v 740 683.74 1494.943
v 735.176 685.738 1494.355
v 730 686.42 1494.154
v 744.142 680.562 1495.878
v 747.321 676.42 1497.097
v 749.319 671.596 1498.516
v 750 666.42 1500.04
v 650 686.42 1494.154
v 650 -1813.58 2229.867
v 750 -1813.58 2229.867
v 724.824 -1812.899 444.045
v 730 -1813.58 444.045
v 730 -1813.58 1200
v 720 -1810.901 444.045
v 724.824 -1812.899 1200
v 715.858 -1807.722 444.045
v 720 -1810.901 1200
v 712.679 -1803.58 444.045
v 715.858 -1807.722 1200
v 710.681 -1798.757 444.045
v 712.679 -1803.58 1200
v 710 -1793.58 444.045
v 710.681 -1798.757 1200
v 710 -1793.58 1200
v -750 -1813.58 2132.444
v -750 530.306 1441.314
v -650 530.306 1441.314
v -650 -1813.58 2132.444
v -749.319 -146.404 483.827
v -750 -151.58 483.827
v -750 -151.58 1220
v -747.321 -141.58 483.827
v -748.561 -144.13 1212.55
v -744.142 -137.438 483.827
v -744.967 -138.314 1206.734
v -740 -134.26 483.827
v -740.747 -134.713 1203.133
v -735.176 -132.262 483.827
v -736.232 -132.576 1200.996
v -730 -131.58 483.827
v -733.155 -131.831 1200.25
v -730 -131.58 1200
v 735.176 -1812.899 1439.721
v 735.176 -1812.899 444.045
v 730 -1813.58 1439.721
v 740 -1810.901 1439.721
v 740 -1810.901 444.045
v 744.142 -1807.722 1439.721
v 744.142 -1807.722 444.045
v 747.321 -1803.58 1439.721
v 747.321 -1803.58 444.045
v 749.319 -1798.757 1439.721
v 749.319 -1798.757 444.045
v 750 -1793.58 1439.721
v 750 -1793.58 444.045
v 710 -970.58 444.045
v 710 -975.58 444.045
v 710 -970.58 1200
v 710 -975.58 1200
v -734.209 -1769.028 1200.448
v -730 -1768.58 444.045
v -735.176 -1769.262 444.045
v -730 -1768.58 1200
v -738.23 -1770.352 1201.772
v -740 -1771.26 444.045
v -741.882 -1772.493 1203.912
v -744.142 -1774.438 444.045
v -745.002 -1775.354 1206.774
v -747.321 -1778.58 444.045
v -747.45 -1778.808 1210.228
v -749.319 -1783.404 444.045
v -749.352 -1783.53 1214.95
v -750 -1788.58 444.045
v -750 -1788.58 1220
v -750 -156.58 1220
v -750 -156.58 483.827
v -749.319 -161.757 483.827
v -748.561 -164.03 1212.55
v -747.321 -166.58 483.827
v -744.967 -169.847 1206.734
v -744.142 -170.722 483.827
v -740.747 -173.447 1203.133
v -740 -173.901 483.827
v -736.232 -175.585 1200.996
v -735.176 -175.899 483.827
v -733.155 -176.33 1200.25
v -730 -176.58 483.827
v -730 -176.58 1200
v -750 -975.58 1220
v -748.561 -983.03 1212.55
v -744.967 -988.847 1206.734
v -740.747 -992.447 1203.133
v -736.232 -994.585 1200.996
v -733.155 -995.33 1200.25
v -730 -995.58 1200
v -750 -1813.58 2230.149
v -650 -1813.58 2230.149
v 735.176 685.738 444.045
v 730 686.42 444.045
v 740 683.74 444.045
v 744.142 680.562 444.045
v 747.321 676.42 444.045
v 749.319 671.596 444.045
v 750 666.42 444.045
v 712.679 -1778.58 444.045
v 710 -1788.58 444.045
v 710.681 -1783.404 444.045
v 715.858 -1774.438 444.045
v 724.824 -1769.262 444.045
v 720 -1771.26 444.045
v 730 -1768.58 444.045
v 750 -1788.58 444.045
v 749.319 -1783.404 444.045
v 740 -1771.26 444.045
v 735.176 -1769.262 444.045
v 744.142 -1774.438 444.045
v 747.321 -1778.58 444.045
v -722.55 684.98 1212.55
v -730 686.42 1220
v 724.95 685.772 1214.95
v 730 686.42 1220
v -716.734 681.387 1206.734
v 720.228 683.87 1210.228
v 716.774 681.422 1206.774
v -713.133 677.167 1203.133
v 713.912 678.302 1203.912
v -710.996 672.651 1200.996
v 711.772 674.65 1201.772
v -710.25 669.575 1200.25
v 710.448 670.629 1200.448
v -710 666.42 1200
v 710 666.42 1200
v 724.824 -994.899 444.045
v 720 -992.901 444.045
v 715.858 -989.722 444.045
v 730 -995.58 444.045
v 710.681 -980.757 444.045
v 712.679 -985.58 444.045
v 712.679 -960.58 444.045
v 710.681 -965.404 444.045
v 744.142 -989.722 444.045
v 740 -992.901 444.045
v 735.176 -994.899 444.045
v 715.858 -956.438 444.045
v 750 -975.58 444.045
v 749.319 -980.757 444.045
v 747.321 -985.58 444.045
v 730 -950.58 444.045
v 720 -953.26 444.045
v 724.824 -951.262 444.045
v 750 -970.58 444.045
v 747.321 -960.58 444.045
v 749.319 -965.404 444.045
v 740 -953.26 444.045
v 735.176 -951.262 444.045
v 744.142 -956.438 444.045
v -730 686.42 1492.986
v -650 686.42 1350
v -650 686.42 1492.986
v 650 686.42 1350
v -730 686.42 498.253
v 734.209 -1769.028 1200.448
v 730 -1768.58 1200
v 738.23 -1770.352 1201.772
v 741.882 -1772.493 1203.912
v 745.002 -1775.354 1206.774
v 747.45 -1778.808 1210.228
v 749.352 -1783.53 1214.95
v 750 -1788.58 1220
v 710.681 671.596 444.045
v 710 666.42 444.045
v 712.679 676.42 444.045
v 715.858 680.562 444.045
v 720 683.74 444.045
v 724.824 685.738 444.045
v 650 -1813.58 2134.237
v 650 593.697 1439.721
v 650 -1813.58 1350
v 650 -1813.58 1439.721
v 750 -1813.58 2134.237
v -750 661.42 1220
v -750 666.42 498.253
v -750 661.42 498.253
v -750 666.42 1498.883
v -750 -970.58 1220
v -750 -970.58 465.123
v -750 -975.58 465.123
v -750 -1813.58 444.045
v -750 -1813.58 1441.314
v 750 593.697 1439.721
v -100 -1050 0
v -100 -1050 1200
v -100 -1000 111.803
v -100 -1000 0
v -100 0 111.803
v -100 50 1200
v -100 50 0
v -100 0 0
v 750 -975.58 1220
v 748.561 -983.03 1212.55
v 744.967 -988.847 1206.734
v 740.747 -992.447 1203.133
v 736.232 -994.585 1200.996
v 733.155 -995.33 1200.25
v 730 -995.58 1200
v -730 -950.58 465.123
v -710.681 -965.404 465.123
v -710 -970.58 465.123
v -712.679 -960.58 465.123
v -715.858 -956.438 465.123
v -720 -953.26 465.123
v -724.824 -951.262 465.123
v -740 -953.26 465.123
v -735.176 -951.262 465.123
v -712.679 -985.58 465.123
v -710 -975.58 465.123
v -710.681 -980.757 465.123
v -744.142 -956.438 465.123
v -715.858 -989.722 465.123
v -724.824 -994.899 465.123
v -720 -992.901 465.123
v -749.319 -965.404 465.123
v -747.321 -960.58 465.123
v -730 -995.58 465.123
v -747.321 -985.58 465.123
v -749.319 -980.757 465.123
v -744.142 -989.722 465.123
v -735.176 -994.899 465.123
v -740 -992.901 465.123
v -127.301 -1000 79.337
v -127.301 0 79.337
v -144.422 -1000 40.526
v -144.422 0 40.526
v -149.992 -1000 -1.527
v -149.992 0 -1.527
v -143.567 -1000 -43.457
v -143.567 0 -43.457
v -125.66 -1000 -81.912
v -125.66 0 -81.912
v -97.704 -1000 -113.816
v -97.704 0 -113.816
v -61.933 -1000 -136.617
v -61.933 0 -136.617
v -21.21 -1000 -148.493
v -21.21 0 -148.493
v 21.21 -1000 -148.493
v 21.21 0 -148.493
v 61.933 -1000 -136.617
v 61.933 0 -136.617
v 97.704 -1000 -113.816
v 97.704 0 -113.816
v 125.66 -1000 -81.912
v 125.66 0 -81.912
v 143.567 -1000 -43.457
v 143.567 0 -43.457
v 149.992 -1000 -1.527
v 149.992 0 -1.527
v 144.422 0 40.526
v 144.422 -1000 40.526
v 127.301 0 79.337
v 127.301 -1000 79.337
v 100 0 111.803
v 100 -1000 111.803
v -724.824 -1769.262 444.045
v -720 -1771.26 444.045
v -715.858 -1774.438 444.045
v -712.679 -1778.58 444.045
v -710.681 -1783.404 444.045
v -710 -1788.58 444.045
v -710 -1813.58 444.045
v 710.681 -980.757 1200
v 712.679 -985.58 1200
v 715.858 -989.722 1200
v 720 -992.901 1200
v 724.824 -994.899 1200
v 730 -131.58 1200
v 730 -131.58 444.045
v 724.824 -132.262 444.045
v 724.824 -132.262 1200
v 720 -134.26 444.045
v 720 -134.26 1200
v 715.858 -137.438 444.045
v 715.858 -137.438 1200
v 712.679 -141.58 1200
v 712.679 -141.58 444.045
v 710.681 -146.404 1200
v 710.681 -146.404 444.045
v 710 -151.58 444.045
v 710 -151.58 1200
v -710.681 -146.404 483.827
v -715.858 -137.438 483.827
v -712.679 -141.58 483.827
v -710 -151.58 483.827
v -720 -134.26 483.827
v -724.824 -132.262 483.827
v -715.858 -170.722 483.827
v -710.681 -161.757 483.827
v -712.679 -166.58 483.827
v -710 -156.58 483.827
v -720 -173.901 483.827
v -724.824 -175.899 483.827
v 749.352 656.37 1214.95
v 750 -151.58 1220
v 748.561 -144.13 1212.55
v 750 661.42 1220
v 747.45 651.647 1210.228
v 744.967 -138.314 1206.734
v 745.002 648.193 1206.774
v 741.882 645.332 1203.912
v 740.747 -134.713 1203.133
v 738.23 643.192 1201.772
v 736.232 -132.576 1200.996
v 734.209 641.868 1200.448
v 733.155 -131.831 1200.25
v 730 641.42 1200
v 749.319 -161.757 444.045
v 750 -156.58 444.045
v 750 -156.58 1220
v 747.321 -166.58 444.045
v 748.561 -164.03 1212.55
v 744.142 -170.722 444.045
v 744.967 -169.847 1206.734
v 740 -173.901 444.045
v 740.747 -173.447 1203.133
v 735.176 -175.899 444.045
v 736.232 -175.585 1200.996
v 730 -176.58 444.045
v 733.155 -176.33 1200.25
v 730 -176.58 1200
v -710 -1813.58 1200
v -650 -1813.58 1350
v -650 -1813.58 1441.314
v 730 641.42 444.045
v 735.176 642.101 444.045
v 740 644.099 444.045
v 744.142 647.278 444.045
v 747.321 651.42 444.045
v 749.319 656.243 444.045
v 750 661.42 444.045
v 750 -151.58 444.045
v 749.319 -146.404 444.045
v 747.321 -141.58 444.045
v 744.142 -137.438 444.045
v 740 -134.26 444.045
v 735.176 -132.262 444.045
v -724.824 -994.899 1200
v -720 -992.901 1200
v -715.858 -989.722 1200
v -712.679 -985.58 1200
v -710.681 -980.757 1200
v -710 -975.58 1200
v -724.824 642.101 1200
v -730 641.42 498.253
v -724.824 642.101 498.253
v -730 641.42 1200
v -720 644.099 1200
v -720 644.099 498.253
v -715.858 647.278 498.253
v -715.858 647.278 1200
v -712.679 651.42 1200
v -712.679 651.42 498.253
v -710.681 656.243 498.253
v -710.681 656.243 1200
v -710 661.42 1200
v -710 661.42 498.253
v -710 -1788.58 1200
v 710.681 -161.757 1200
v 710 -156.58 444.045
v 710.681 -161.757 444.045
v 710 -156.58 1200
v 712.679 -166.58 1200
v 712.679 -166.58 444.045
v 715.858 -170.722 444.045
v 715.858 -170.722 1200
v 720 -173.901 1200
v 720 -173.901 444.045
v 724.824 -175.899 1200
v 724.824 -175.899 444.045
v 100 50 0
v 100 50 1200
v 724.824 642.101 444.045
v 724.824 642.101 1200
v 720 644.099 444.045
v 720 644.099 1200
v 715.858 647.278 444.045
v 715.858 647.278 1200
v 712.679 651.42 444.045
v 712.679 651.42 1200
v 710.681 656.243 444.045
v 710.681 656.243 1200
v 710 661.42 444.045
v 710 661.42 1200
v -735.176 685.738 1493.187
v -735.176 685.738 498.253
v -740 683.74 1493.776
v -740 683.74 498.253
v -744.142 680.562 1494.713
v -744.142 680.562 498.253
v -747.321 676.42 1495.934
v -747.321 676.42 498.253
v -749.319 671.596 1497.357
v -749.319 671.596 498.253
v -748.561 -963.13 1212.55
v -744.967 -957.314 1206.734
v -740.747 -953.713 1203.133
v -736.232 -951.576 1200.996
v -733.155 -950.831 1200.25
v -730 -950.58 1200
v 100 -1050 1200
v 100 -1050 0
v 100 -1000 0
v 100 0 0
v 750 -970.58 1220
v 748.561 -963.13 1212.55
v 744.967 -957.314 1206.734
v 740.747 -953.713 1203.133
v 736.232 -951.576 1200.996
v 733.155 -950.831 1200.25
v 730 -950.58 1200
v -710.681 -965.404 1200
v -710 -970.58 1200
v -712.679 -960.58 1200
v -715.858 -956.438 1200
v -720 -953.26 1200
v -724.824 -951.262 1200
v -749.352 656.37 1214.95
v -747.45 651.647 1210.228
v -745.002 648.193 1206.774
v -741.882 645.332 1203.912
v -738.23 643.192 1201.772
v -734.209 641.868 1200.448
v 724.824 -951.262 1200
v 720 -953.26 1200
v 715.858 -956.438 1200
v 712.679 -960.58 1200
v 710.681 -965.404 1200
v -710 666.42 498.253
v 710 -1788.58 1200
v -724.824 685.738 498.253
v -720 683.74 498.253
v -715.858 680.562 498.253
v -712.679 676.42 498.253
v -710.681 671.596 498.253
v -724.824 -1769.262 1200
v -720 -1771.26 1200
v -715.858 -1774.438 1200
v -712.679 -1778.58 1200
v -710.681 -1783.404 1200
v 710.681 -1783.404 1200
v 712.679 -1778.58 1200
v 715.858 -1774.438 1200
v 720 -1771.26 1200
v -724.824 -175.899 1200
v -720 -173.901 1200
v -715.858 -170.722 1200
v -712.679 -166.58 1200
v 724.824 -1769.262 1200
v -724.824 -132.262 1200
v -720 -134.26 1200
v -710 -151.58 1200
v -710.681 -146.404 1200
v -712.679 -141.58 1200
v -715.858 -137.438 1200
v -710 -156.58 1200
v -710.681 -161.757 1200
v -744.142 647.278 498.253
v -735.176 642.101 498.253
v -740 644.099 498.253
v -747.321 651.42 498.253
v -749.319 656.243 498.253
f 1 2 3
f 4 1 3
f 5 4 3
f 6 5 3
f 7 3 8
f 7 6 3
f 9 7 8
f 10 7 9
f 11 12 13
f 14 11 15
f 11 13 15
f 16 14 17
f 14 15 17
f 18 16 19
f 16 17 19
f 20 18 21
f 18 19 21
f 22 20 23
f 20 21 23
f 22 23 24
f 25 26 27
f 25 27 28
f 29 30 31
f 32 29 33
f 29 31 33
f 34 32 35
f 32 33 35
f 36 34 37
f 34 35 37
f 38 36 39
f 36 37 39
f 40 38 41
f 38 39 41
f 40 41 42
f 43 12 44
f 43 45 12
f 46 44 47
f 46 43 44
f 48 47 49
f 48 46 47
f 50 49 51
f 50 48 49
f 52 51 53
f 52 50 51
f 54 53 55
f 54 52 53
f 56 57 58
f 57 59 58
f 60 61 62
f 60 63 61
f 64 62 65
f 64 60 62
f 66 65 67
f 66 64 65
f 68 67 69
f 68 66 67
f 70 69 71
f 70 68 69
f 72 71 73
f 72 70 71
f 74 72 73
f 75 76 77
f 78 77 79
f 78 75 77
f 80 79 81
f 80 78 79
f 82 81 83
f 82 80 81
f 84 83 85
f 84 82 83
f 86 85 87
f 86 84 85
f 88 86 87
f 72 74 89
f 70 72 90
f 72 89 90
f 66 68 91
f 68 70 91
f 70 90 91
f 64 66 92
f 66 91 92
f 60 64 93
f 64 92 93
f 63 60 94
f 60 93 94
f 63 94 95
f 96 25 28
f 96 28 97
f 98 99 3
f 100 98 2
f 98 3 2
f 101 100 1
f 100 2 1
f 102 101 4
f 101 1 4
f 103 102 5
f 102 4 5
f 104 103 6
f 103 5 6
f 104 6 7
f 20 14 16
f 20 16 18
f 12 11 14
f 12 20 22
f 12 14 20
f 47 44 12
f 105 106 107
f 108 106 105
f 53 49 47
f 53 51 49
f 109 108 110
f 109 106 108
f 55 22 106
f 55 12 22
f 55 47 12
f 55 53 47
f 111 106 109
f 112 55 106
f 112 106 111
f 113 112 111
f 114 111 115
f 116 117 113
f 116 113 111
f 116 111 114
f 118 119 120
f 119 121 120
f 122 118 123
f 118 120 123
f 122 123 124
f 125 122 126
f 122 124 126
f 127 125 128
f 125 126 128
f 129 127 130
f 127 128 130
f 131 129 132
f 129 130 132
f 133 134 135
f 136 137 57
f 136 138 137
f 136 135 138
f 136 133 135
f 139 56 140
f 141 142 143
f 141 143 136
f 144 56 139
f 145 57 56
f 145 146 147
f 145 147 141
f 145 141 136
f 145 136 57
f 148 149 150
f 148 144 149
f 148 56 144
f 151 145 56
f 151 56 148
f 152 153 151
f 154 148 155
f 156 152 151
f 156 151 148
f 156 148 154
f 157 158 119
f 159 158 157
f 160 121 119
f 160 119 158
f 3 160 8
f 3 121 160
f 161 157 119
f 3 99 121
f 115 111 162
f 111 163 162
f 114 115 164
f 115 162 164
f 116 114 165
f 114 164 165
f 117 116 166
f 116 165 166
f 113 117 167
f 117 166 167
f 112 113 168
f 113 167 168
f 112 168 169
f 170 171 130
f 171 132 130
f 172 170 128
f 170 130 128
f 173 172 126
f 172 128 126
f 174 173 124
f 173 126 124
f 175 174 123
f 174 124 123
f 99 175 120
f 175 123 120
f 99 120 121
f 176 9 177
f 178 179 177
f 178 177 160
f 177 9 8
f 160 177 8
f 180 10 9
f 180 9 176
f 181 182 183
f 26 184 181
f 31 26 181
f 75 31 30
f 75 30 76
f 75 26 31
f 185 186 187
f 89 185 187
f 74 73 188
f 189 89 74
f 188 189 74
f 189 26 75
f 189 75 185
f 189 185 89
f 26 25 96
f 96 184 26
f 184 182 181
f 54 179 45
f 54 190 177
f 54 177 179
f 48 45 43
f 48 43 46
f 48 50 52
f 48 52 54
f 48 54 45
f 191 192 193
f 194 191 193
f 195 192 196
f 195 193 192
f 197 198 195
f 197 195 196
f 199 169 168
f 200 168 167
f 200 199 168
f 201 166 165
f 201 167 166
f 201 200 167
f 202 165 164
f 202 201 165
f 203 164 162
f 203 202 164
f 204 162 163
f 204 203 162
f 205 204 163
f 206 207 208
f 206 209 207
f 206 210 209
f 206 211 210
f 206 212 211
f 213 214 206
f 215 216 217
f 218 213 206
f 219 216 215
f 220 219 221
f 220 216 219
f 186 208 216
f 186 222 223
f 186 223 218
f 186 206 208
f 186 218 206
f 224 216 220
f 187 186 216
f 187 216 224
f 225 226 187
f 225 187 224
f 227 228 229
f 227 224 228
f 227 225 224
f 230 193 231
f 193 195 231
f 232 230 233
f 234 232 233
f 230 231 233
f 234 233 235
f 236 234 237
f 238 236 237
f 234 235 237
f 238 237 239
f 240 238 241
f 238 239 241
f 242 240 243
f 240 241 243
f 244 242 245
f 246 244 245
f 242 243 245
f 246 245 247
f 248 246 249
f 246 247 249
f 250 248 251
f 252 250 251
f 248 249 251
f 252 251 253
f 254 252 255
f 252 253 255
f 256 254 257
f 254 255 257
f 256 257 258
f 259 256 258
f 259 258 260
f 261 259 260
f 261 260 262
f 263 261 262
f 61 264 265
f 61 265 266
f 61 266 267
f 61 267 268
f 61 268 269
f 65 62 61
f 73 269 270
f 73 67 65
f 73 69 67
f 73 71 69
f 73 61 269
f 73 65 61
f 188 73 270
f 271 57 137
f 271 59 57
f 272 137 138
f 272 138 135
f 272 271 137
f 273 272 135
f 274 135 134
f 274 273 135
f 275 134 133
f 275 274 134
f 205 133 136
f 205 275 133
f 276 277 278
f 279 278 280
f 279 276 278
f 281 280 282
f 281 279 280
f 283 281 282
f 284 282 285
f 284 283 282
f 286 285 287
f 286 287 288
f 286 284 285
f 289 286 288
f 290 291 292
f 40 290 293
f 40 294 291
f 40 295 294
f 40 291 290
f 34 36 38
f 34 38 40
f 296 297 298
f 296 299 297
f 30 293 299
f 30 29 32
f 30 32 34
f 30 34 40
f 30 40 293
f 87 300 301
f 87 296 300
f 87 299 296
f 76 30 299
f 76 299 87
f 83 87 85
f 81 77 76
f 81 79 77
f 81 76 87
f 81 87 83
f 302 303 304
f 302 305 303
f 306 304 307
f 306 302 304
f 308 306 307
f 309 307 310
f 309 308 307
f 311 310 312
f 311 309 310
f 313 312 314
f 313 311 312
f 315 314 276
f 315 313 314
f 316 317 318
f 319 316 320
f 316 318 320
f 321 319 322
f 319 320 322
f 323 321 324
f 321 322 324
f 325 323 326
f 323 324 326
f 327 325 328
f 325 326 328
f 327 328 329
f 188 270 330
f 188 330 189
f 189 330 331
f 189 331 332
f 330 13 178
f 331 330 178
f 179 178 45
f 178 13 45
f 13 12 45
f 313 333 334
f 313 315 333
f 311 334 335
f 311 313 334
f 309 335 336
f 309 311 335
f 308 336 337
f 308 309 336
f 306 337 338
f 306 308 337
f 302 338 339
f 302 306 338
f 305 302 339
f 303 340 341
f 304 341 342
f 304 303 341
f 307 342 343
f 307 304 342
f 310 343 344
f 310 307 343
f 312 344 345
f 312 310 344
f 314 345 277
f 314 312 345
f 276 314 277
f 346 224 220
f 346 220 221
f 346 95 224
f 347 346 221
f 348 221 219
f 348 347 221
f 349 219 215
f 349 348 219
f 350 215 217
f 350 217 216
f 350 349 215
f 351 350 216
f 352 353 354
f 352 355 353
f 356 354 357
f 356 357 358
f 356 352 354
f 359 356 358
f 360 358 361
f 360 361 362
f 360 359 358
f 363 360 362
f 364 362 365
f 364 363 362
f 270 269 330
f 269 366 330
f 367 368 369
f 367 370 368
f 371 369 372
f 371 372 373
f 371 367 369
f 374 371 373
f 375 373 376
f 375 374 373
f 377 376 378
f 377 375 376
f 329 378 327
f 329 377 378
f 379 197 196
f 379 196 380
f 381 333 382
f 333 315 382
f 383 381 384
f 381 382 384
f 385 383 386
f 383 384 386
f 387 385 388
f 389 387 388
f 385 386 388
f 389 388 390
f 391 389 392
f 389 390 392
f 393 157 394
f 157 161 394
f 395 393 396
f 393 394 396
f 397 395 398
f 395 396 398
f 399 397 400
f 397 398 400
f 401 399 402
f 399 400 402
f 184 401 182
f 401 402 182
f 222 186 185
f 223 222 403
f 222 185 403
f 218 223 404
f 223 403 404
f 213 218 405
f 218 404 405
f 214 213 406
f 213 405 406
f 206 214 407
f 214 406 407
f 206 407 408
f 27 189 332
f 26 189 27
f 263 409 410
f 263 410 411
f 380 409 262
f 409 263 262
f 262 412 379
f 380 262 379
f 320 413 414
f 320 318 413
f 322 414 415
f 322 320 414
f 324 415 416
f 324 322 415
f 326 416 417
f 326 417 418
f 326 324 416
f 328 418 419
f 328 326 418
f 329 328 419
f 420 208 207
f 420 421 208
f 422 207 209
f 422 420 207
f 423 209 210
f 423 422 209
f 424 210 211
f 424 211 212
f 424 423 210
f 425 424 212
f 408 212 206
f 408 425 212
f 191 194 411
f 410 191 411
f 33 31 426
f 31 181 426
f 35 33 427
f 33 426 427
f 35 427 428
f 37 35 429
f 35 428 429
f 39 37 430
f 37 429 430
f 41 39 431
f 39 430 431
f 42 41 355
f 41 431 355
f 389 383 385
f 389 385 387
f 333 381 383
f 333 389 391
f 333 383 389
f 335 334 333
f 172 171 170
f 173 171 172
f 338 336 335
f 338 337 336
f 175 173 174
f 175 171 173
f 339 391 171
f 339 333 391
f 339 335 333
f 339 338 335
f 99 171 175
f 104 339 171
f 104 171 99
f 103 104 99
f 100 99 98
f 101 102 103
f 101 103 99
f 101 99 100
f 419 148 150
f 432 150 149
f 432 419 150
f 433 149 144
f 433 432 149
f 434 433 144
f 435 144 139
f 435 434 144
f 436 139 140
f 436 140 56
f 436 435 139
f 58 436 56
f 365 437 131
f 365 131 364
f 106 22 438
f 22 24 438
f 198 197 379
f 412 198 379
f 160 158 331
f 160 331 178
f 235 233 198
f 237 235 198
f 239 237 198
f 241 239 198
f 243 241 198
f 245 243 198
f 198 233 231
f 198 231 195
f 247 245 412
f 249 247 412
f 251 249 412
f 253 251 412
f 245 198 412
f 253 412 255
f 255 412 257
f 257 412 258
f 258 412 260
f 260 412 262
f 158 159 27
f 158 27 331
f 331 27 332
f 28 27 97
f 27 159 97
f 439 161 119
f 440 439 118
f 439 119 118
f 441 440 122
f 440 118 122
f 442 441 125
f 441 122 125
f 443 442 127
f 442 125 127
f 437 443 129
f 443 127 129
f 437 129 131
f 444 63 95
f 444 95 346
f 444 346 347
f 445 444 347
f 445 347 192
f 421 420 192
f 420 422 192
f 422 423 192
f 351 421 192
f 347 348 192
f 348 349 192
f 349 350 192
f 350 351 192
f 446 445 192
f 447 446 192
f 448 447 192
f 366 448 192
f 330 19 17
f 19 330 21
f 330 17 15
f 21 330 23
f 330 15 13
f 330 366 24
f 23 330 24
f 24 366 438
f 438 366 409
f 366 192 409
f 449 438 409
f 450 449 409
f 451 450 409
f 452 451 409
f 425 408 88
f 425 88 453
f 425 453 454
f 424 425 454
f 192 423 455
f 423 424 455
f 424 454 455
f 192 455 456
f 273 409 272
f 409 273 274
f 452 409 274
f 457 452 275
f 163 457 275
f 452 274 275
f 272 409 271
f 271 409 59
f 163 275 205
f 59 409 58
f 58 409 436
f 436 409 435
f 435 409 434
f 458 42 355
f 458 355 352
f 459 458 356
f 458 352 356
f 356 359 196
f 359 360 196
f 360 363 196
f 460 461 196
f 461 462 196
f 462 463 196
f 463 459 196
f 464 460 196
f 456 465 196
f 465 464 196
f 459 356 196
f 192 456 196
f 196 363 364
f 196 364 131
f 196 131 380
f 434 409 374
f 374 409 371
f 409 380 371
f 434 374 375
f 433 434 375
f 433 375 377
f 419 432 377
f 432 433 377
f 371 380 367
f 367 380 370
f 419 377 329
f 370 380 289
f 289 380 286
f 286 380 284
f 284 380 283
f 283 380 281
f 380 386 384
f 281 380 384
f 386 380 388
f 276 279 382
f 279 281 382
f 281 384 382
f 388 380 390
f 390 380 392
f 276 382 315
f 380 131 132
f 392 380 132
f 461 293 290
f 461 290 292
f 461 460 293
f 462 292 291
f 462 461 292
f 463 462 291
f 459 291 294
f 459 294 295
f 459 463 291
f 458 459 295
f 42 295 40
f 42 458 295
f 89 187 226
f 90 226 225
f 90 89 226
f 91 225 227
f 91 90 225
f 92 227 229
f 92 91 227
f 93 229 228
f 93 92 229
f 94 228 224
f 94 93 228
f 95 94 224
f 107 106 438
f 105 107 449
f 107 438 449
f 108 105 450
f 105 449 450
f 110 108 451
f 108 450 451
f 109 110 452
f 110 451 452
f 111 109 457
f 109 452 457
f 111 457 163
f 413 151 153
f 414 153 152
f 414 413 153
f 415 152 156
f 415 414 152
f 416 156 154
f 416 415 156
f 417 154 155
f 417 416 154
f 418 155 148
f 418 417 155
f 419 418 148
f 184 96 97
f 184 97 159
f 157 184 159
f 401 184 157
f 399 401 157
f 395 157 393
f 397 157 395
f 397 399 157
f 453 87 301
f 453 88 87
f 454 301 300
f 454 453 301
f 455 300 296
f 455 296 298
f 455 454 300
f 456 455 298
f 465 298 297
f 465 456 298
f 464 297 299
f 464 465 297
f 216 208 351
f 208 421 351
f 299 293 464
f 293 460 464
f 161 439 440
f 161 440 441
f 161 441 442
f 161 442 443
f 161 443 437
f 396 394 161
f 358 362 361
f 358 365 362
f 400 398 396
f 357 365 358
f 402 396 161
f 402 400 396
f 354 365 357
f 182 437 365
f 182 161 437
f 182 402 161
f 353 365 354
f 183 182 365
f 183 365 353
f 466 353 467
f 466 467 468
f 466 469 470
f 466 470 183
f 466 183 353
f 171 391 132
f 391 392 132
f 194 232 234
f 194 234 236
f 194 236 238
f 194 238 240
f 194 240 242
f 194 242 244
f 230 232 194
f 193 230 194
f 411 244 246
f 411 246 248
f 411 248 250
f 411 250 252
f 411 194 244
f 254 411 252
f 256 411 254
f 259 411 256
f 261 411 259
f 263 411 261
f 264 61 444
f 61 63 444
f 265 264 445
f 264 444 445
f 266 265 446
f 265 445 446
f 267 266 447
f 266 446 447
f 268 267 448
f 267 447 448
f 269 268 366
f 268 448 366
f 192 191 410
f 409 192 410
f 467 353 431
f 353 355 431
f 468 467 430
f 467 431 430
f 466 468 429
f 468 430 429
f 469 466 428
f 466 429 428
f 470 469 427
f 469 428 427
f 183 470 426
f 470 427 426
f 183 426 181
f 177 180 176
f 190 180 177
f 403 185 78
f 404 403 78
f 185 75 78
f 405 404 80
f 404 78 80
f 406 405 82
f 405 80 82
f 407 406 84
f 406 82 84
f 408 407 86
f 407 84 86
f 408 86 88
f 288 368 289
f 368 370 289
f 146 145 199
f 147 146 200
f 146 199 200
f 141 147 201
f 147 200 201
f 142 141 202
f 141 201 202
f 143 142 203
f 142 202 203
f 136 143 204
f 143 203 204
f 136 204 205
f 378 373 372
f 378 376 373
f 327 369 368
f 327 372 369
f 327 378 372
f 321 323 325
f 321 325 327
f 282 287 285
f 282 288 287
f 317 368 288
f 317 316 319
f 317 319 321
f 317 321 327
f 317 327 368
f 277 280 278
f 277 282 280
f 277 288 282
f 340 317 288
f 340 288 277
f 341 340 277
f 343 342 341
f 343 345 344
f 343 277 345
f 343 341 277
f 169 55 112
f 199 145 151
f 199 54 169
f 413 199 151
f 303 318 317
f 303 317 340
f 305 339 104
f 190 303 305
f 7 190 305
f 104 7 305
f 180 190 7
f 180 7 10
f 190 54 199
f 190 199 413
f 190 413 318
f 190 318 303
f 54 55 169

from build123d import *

# Parameters (mm, degrees)
F0_R      = 150
F1_DEPTH  = 1000
F2_W      = 200
F2_H      = 1100
F3_DEPTH  = 1200
F4_W      = 1500
F4_H      = 2500
F4_W_2    = 200
F4_H_2    = 1100
F5_DEPTH  = 150
F7_DEPTH  = 100
F9_DEPTH  = 100
F11_W     = 45
F11_H     = 755.9551119804
F11_H_2   = 734.8766446114
F11_H_3   = 716.1733627319
F11_H_4   = 701.7465054989
F12_DEPTH = 40
F13_R     = 19.99999
F14_W     = 45
F14_H     = 755.9551119804
F15_DEPTH = 40
F17_R     = 19.99999


# Not quite as in the source:
# - a fillet or chamfer is up to 0.001 mm smaller than in the source, because OpenCascade refuses the exact size


with BuildPart() as f1:
    # F0 (on Front) → F1 (new body)
    with BuildSketch(Plane.XZ):
        Circle(F0_R)
    extrude(amount=F1_DEPTH)

    # F2 (on Top) → F3 (join)
    with BuildSketch(Plane.XY):
        with Locations((0, -500)):
            Rectangle(F2_W, F2_H)
    extrude(amount=F3_DEPTH)

    # F4 (on face) → F5 (join)
    with BuildSketch(Plane.XY.offset(1200)):
        with Locations((0, -563.5802745819)):
            Rectangle(F4_W, F4_H)
        with Locations((0, -500)):
            Rectangle(F4_W_2, F4_H_2, mode=Mode.SUBTRACT)
        with Locations((0, -500)):
            Rectangle(F4_W_2, F4_H_2)
    extrude(amount=F5_DEPTH)

    # F6 (on face) → F7 (join)
    with BuildSketch(Plane.YZ.offset(750)):
        Polygon((-1813.5802745819, 1350), (686.4197254181, 1350), (686.4197254181, 1494.1539764404), (-1813.5802745819, 2229.8667430878), (-1813.5802745819, 2134.2372894287), (593.697309494, 1439.7211074829), (-1813.5802745819, 1439.7211074829), align=None)
    extrude(amount=-F7_DEPTH)


with BuildPart() as f9:
    # F8 (on face) → F9 (new body)
    with BuildSketch(Plane(origin=(-750, 0, 0), x_dir=(0, -1, 0), z_dir=(-1, 0, 0))):
        Polygon((-686.4197254181, 1350), (1813.5802745819, 1350), (1813.5802745819, 1441.313624382), (-530.3064584732, 1441.313624382), (1813.5802745819, 2132.4443817139), (1813.5802745819, 2230.1487922668), (-686.4197254181, 1492.9856567951), align=None)
    extrude(amount=-F9_DEPTH)


with BuildPart() as f1_1:
    add(f1.part)

    # F10: union F9
    add(f9.part)

    # F11 (on face) → F12 (join)
    with BuildSketch(Plane(origin=(-750, 0, 0), x_dir=(0, -1, 0), z_dir=(-1, 0, 0))):
        with Locations((1791.0802745819, 822.0224440098)):
            Rectangle(F11_W, F11_H)
        with Locations((973.0802745819, 832.5616776943)):
            Rectangle(F11_W, F11_H_2)
        with Locations((154.0802745819, 841.913318634)):
            Rectangle(F11_W, F11_H_3)
        with Locations((-663.9197254181, 849.1267472506)):
            Rectangle(F11_W, F11_H_4)
    extrude(amount=-F12_DEPTH)

    # F13 (radius 20 in the source; OpenCascade refuses exactly that, so slightly less here)
    f13_edges = [f1_1.edges().sort_by_distance(p)[0] for p in [
        (-750, -1768.580275, 822.022444),
        (-710, -1768.580275, 822.022444),
        (-750, -950.580275, 832.561678),
        (-710, -950.580275, 832.561678),
        (-750, -995.580275, 832.561678),
        (-710, -995.580275, 832.561678),
        (-750, -131.580275, 841.913319),
        (-750, -176.580275, 841.913319),
        (-710, -131.580275, 841.913319),
        (-750, 686.419725, 995.619576),
        (-750, 641.419725, 849.126747),
        (-710, 686.419725, 849.126747),
        (-710, -176.580275, 841.913319),
        (-710, 641.419725, 849.126747),
        (-750, -1382.080275, 1200),
        (-750, -563.580275, 1200),
        (-750, 254.919725, 1200),
    ]]
    fillet(f13_edges, radius=F13_R)


with BuildPart() as f15:
    # F14 (on face) → F15 (new body)
    with BuildSketch(Plane.YZ.offset(750)):
        with Locations((-1791.0802745819, 822.0224440098)):
            Rectangle(F14_W, F14_H)
    extrude(amount=-F15_DEPTH)


with BuildPart() as f15b:
    # F14 (on face) → F15, piece 2 (new body)
    with BuildSketch(Plane.YZ.offset(750)):
        with Locations((-973.0802745819, 822.0224440098)):
            Rectangle(F14_W, F14_H)
    extrude(amount=-F15_DEPTH)


with BuildPart() as f15c:
    # F14 (on face) → F15, piece 3 (new body)
    with BuildSketch(Plane.YZ.offset(750)):
        with Locations((-154.0802745819, 822.0224440098)):
            Rectangle(F14_W, F14_H)
    extrude(amount=-F15_DEPTH)


with BuildPart() as f15d:
    # F14 (on face) → F15, piece 4 (new body)
    with BuildSketch(Plane.YZ.offset(750)):
        with Locations((663.9197254181, 822.0224440098)):
            Rectangle(F14_W, F14_H)
    extrude(amount=-F15_DEPTH)


with BuildPart() as f1_2:
    add(f1_1.part)

    # F16: union F15, F15b, F15c, F15d
    add(f15.part)
    add(f15b.part)
    add(f15c.part)
    add(f15d.part)

    # F17 (radius 20 in the source; OpenCascade refuses exactly that, so slightly less here)
    f17_edges = [f1_2.edges().sort_by_distance(p)[0] for p in [
        (750, 686.419725, 969.099432),
        (710, 686.419725, 822.022444),
        (750, 641.419725, 822.022444),
        (750, -131.580275, 822.022444),
        (710, -131.580275, 822.022444),
        (750, -176.580275, 822.022444),
        (750, -950.580275, 822.022444),
        (710, -950.580275, 822.022444),
        (750, -995.580275, 822.022444),
        (710, -1768.580275, 822.022444),
        (750, -1768.580275, 822.022444),
        (750, -1813.580275, 941.882998),
        (710, -995.580275, 822.022444),
        (710, -1813.580275, 822.022444),
        (710, -176.580275, 822.022444),
        (710, 641.419725, 822.022444),
        (750, 254.919725, 1200),
        (750, -563.580275, 1200),
        (750, -1382.080275, 1200),
        (-9.999995, 686.419725, 1200),
    ]]
    fillet(f17_edges, radius=F17_R)


solid = f1_2.part
